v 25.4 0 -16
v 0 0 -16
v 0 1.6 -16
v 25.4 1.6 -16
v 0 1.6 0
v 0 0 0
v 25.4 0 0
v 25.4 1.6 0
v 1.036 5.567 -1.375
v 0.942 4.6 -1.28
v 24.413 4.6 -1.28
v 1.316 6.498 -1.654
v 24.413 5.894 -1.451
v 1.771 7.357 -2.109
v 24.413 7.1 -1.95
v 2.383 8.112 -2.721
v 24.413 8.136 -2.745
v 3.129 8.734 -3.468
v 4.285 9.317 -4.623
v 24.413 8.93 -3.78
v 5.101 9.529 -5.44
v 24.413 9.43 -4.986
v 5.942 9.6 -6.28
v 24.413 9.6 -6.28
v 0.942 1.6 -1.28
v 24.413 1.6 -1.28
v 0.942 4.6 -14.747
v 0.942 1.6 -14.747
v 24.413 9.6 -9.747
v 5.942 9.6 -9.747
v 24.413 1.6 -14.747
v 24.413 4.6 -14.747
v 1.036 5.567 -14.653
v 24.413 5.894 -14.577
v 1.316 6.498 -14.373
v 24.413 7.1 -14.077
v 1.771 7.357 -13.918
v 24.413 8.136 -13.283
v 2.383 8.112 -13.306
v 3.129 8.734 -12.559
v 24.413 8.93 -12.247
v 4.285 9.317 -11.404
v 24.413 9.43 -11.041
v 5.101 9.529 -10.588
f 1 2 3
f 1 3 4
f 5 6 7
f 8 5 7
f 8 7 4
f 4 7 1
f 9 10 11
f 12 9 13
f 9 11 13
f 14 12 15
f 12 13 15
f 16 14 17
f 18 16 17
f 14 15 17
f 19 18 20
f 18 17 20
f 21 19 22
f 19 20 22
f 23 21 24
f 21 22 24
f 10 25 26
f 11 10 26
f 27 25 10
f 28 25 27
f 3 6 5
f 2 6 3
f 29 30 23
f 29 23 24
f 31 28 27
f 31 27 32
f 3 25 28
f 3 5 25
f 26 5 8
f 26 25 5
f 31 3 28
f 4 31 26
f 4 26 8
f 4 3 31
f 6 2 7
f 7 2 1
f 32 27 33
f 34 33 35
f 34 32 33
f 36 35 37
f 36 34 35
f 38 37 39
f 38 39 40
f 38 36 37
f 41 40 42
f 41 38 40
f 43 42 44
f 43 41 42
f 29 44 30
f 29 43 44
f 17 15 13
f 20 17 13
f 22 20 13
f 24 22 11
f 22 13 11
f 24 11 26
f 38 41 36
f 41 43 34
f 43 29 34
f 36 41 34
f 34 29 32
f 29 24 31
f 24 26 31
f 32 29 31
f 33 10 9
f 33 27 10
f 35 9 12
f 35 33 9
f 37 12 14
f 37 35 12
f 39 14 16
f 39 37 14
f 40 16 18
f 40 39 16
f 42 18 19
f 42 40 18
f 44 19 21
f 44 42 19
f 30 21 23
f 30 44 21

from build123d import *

# Parameters (mm, degrees)
SKETCH1_W           = 25.4
SKETCH1_H           = 16
BOSS_EXTRUDE1_DEPTH = 1.6
SKETCH2_W           = 23.471528358
SKETCH2_H           = 13.466700145
BOSS_EXTRUDE2_DEPTH = 8
FILLET1_R           = 5


with BuildPart() as part:
    # Sketch1 → Boss-Extrude1 (new body)
    with BuildSketch(Plane(origin=(0, 0, 0), x_dir=(1, 0, 0), z_dir=(0, 1, 0))):
        with Locations((12.7, 8)):
            Rectangle(SKETCH1_W, SKETCH1_H)
    extrude(amount=BOSS_EXTRUDE1_DEPTH)

    # Sketch2 → Boss-Extrude2 (add)
    with BuildSketch(Plane(origin=(0, 1.6, 0), x_dir=(1, 0, 0), z_dir=(0, 1, 0))):
        with Locations((12.677642984, 8.013617828)):
            Rectangle(SKETCH2_W, SKETCH2_H)
    extrude(amount=BOSS_EXTRUDE2_DEPTH)

    # Fillet1
    fillet1_edges = [part.edges().sort_by_distance(p)[0] for p in [
        (0.941878805, 9.6, -8.013617827),
        (12.677642984, 9.6, -1.280267755),
        (12.677642984, 9.6, -14.7469679),
    ]]
    fillet(fillet1_edges, radius=FILLET1_R)


solid = part.part
